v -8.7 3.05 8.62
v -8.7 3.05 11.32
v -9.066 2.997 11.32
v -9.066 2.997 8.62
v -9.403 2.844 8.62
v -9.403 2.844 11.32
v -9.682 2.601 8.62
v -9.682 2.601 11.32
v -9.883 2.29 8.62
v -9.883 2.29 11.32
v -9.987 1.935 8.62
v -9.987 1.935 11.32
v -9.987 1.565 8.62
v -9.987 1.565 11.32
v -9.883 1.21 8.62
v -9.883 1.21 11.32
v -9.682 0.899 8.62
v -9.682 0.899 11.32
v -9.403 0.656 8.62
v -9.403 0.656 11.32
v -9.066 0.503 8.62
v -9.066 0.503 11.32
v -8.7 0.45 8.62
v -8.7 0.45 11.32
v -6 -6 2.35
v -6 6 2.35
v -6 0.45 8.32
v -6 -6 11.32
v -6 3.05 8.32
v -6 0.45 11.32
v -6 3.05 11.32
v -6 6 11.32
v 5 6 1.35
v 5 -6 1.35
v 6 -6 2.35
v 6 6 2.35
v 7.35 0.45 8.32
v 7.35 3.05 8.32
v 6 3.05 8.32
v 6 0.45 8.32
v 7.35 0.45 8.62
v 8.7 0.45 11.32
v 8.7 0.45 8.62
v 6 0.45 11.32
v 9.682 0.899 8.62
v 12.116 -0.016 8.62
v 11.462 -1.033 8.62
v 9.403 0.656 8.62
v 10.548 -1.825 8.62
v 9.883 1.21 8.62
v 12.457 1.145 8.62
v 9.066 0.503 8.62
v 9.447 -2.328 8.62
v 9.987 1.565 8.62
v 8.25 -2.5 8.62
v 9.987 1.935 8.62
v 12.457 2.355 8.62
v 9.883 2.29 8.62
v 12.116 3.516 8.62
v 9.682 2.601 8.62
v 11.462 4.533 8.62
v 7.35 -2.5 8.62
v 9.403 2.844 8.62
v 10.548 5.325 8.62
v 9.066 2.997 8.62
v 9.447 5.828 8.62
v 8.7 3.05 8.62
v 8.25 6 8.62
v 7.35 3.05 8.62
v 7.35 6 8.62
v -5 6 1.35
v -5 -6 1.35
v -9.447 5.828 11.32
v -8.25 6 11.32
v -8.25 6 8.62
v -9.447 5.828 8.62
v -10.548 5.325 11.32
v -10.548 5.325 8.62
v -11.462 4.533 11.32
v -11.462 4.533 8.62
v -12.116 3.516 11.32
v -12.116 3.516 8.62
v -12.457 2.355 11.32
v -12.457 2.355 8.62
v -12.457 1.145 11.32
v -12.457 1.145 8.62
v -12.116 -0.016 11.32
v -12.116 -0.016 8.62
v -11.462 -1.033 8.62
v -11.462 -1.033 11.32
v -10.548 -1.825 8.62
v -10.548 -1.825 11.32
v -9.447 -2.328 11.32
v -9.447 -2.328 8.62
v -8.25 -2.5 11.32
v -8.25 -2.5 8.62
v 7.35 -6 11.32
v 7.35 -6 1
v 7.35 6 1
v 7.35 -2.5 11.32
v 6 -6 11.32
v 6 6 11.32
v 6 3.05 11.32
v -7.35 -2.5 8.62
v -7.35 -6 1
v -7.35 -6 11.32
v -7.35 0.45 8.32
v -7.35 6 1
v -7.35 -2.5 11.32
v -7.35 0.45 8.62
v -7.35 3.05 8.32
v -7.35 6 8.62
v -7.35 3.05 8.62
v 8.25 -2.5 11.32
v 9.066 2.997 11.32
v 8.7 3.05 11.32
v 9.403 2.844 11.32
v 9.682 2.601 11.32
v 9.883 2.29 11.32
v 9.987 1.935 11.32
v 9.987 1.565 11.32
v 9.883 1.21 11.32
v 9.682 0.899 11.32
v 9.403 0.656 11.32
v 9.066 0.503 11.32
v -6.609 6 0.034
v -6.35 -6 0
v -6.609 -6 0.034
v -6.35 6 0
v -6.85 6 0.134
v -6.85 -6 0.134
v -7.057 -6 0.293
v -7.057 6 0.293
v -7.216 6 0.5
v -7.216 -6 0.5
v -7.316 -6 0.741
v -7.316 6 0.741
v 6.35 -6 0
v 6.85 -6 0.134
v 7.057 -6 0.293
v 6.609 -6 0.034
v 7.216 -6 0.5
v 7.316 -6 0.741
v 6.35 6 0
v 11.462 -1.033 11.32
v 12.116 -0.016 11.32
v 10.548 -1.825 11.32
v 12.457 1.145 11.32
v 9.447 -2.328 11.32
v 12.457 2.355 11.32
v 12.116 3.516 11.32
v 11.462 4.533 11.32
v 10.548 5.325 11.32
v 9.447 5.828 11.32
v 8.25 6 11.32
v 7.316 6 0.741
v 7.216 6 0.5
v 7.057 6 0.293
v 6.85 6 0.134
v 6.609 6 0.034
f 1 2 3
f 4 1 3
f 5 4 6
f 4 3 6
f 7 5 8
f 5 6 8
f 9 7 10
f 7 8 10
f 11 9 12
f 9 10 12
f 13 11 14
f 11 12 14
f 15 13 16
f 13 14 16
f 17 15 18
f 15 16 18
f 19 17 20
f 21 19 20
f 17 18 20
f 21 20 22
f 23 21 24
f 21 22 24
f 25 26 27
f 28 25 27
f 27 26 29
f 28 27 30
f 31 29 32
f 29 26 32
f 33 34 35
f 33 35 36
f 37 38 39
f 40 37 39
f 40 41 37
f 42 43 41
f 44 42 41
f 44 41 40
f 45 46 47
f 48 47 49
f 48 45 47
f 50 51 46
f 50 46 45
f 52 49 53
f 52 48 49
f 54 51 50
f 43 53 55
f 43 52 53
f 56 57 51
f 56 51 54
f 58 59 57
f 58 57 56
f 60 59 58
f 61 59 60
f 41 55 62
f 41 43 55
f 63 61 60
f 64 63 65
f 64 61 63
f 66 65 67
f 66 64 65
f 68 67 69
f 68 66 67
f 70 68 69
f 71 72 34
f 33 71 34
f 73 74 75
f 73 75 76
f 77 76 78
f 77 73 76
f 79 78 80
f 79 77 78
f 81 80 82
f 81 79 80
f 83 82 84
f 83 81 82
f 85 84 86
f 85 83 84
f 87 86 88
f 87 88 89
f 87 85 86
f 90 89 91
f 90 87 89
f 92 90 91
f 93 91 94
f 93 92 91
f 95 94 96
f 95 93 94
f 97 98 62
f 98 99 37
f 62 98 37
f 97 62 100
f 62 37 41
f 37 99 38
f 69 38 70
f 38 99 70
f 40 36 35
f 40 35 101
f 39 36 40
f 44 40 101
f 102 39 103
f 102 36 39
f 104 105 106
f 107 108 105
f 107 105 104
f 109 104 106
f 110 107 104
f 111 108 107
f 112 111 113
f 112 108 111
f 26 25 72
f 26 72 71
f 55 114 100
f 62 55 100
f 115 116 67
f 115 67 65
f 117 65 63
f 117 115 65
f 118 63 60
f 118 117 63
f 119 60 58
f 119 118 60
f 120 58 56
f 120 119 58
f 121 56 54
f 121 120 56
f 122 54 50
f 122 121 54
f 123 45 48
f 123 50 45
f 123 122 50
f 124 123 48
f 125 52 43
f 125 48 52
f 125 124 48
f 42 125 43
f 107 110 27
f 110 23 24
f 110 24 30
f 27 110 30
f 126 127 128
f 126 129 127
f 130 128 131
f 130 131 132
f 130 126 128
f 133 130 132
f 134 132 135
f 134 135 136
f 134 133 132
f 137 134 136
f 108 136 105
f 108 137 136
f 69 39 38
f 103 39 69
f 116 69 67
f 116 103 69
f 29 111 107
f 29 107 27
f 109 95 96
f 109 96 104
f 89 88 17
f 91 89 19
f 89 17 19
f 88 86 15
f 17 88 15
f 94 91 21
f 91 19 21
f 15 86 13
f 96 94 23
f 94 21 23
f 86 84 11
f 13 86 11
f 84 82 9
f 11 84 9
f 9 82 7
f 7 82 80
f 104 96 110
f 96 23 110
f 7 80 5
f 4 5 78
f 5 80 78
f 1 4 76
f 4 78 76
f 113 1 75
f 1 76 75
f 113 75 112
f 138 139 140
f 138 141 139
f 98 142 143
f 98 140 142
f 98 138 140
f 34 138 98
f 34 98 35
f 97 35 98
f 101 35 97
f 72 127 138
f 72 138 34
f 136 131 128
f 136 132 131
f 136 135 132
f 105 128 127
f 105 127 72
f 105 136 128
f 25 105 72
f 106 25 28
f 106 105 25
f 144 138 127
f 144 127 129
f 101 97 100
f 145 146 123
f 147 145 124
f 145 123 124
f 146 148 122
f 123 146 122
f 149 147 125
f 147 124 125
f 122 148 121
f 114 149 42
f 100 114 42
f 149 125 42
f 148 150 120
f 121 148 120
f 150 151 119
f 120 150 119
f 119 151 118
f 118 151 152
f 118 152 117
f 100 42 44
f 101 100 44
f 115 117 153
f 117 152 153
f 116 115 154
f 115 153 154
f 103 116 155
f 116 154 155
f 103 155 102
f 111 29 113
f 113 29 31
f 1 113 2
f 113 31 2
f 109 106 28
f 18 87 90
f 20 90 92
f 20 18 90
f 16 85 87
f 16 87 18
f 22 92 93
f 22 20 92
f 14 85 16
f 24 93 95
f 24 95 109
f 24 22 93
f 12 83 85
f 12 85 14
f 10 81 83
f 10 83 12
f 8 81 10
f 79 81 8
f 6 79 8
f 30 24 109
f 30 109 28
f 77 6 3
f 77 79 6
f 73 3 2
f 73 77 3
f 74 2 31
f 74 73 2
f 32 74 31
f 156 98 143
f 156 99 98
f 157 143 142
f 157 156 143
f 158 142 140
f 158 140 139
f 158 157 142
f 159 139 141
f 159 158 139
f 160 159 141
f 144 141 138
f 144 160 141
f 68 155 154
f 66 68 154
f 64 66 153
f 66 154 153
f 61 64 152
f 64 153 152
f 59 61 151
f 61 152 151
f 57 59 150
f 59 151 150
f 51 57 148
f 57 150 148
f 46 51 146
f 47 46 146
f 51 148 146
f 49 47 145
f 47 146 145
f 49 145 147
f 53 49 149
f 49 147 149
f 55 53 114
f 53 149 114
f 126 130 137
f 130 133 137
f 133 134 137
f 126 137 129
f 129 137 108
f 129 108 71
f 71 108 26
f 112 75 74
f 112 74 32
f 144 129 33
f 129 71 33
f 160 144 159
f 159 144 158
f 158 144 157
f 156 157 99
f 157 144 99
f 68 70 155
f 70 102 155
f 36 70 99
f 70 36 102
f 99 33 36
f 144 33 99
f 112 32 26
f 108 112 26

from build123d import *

# Parameters (mm, degrees)
SKETCH_1_W          = 12
SKETCH_1_H          = 12
EXTRUDE_1_DEPTH     = 1.35
SKETCH_2_W          = 11.32
SKETCH_2_H          = 12
EXTRUDE_2_DEPTH     = 1.35
EXTRUDE_3_DEPTH     = 2.7
CUT_EXTRUDE_1_DEPTH = 3
CHAMFER_1_SIZE      = 1
FILLET_1_R          = 1


with BuildPart() as part:
    # 草图1 → 凸台-拉伸1 (new body)
    with BuildSketch(Plane.XY):
        Rectangle(SKETCH_1_W, SKETCH_1_H)
    extrude(amount=EXTRUDE_1_DEPTH)

    # 草图2 → 凸台-拉伸2 (add)
    with BuildSketch(Plane.ZY.offset(6)):
        with Locations((5.66, 0)):
            Rectangle(SKETCH_2_W, SKETCH_2_H)
    extrude_2 = extrude(amount=EXTRUDE_2_DEPTH)

    # 草图3 → 凸台-拉伸3 (add)
    with BuildSketch(Plane.XY.offset(11.32)):
        with BuildLine():
            Line((-7.35, 6), (-8.25, 6))
            ThreePointArc((-8.25, 6), (-12.5, 1.75), (-8.25, -2.5))
            Line((-8.25, -2.5), (-7.35, -2.5))
            Line((-7.35, -2.5), (-7.35, 6))
        make_face()
    extrude_3 = extrude(amount=-EXTRUDE_3_DEPTH)

    # 草图4 → 切除-拉伸1 (cut)
    with BuildSketch(Plane.XY.offset(11.32)):
        with BuildLine():
            Line((-6, 3.05), (-8.7, 3.05))
            ThreePointArc((-8.7, 3.05), (-10, 1.75), (-8.7, 0.45))
            Line((-8.7, 0.45), (-6, 0.45))
            Line((-6, 0.45), (-6, 3.05))
        make_face()
    cut_extrude_1 = extrude(amount=-CUT_EXTRUDE_1_DEPTH, mode=Mode.SUBTRACT)

    # 镜向1: 凸台-拉伸2, 凸台-拉伸3, 切除-拉伸1 across plane
    add(extrude_2.mirror(Plane(origin=(0, 0, 0), x_dir=(0, 0, 1), z_dir=(1, 0, 0))))
    add(extrude_3.mirror(Plane(origin=(0, 0, 0), x_dir=(0, 0, 1), z_dir=(1, 0, 0))))
    add(cut_extrude_1.mirror(Plane(origin=(0, 0, 0), x_dir=(0, 0, 1), z_dir=(1, 0, 0))), mode=Mode.SUBTRACT)

    # 倒角1
    chamfer_1_edges = [part.edges().sort_by_distance(p)[0] for p in [
        (-6, 0, 1.35),
        (6, 0, 1.35),
    ]]
    chamfer(chamfer_1_edges, length=CHAMFER_1_SIZE)

    # 圆角1
    fillet_1_edges = [part.edges().sort_by_distance(p)[0] for p in [
        (-7.35, 0, 0),
        (7.35, 0, 0),
    ]]
    fillet(fillet_1_edges, radius=FILLET_1_R)


solid = part.part
